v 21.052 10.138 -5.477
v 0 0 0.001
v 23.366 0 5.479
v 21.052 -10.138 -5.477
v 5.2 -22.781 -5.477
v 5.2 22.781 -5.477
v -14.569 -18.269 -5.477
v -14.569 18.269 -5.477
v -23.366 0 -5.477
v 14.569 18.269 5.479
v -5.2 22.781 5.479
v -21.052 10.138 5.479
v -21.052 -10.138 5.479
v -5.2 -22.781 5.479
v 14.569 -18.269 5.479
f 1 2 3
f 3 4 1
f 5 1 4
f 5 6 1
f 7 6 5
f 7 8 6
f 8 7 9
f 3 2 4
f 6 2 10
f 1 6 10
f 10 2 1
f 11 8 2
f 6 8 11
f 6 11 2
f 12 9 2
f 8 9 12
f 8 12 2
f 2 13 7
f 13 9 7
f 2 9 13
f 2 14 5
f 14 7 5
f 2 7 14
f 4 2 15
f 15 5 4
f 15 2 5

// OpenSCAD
diameter=24;
//depth=10;
n=7;
$fa=1;
$fs=1;
  w=90;
//h=2;
//a=180/n;
//r=diameter/2;
//x=sqrt(2*((r*sin(a))^2)/(1-2*(sin(a))^2));
//ang=atan(x/(sqrt(2)*r));
/*
module hirth(n=60,d=24,h=2) {
  difference() {
    cylinder(d=diameter,h=h+x/sqrt(2),$fn=n);
    translate([0,0,h])for (a=[0:360/n:360-360/n]) rotate ([0,0,a]) rotate([90+ang/2,0,0])rotate([0,0,45])cube([2*x,2*x,r+x]);
  }
}
*/
/*
difference() {
  hirth(n=n,d=diameter,h=h);
  translate([0,0,h/2])cylinder(d=16,h=h);
  for(a=[0:90:270]) rotate([0,0,a])translate([5,0,-0.01])cylinder(d=3,h=h);
  translate([0,0,-0.01])cylinder(d=4,h=h);
  }
  */
module tooth() {
//  n=12;
//  a=360/n;
d=diameter;
  r=diameter/2; //first approx of cylinder radius
//  h1=r*cos(a/2);
//  b1=2*r*sin(a/2);
//  h2=b1/2/tan(w/2);
//  r*sin(a/2)/h2=tan(w/2);
//  h2=r*sin(a/2)/tan(w/2);
//  h2=r*sin(180/n)/tan(w/2);
//  b=asin(h2/h1);
//b=asin(r*cos(180/n)/(r*sin(180/n)/tan(w/2)));
//b=asin(tan(180/n)/tan(w/2));
//echo(tan(180/n));
//echo(tan(w/2));
//echo(b);
//p1=[d*cos(b/2),0,d*sin(b/2)];
//p2=[d*cos(b/2)*cos(180/n),sin(180/n),-d*sin(b/2)];
//p3=[d*cos(b/2)*cos(180/n),-sin(180/n),-d*sin(b/2)];
l=r*sin(90/n);
//tan(w/2)=l/h
h=l/tan(w/2);
x=r*cos(90/n);
b=asin(h/x);
  polyhedron(points=[[0,0,0],
                     [d*cos(b),0,d*sin(b)],
                     [d*cos(b)*cos(180/n),d*cos(b)*sin(180/n),-d*sin(b)],
                     [d*cos(b)*cos(180/n),-d*cos(b)*sin(180/n),-d*sin(b)],
                     [0,0,-d*sin(b)]],
                     faces=[[0,2,1],[0,1,3],[1,2,3],[0,4,2],[0,3,4],[4,3,2]]);
}
//[d*cos(b/2),0,d*sin(b/2)] rotated b/2 up
//[d*cos(b/2),0,-d*sin(b/2)] rotated b/2 down
//d*cos(b/2)*cos(180/n),d*cos(b/2)*sin(180/n)
translate([0,0,0.001])for(i=[0:360/n:360])rotate([0,0,i])tooth();
